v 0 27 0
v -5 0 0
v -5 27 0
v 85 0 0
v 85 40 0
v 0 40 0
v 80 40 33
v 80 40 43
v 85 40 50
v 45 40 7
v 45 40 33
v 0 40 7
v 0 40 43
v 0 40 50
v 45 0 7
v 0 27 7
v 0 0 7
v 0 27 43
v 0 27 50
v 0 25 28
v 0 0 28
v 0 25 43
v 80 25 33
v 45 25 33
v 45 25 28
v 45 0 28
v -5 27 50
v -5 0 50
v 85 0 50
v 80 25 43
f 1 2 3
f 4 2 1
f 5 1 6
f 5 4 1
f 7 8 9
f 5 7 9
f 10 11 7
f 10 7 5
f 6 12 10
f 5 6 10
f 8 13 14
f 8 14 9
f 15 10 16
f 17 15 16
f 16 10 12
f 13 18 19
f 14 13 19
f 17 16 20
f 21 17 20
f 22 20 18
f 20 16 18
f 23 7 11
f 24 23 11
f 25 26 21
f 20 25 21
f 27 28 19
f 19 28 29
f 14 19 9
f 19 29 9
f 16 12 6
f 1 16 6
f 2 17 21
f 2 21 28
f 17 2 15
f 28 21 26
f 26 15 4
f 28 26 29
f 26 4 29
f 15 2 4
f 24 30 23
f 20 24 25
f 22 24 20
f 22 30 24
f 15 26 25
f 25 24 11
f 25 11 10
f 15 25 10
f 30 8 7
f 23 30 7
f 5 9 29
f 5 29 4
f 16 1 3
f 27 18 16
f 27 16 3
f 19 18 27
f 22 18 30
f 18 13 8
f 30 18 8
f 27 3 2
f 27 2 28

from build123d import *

# Parameters (mm, degrees)
SKETCH_1_W          = 50
SKETCH_1_H          = 40
EXTRUDE_1_DEPTH     = 85
CUT_EXTRUDE_1_DEPTH = 60
EXTRUDE_2_DEPTH     = 25
SKETCH_4_W          = 50
SKETCH_4_H          = 27
EXTRUDE_3_DEPTH     = 5


with BuildPart() as part:
    # 草图1 → 凸台-拉伸1 (new body)
    with BuildSketch(Plane(origin=(0, 0, 0), x_dir=(0, 0, -1), z_dir=(1, 0, 0))):
        with Locations((-25, 20)):
            Rectangle(SKETCH_1_W, SKETCH_1_H)
    extrude(amount=EXTRUDE_1_DEPTH)

    # 草图2 → 切除-拉伸1 (cut)
    with BuildSketch(Plane(origin=(0, 40, 0), x_dir=(1, 0, 0), z_dir=(0, 1, 0))):
        Polygon((45, -7), (0, -7), (0, -35), (0, -43), (80, -43), (80, -33), (45, -33), align=None)
    extrude(amount=-CUT_EXTRUDE_1_DEPTH, mode=Mode.SUBTRACT)

    # 草图3 → 凸台-拉伸2 (add)
    with BuildSketch(Plane.XZ):
        Polygon((0, 43), (45, 43), (80, 43), (80, 33), (45, 33), (45, 28), (0, 28), align=None)
    extrude(amount=-EXTRUDE_2_DEPTH)

    # 草图4 → 凸台-拉伸3 (add)
    with BuildSketch(Plane.ZY):
        with Locations((25, 13.5)):
            Rectangle(SKETCH_4_W, SKETCH_4_H)
    extrude(amount=EXTRUDE_3_DEPTH)


solid = part.part
